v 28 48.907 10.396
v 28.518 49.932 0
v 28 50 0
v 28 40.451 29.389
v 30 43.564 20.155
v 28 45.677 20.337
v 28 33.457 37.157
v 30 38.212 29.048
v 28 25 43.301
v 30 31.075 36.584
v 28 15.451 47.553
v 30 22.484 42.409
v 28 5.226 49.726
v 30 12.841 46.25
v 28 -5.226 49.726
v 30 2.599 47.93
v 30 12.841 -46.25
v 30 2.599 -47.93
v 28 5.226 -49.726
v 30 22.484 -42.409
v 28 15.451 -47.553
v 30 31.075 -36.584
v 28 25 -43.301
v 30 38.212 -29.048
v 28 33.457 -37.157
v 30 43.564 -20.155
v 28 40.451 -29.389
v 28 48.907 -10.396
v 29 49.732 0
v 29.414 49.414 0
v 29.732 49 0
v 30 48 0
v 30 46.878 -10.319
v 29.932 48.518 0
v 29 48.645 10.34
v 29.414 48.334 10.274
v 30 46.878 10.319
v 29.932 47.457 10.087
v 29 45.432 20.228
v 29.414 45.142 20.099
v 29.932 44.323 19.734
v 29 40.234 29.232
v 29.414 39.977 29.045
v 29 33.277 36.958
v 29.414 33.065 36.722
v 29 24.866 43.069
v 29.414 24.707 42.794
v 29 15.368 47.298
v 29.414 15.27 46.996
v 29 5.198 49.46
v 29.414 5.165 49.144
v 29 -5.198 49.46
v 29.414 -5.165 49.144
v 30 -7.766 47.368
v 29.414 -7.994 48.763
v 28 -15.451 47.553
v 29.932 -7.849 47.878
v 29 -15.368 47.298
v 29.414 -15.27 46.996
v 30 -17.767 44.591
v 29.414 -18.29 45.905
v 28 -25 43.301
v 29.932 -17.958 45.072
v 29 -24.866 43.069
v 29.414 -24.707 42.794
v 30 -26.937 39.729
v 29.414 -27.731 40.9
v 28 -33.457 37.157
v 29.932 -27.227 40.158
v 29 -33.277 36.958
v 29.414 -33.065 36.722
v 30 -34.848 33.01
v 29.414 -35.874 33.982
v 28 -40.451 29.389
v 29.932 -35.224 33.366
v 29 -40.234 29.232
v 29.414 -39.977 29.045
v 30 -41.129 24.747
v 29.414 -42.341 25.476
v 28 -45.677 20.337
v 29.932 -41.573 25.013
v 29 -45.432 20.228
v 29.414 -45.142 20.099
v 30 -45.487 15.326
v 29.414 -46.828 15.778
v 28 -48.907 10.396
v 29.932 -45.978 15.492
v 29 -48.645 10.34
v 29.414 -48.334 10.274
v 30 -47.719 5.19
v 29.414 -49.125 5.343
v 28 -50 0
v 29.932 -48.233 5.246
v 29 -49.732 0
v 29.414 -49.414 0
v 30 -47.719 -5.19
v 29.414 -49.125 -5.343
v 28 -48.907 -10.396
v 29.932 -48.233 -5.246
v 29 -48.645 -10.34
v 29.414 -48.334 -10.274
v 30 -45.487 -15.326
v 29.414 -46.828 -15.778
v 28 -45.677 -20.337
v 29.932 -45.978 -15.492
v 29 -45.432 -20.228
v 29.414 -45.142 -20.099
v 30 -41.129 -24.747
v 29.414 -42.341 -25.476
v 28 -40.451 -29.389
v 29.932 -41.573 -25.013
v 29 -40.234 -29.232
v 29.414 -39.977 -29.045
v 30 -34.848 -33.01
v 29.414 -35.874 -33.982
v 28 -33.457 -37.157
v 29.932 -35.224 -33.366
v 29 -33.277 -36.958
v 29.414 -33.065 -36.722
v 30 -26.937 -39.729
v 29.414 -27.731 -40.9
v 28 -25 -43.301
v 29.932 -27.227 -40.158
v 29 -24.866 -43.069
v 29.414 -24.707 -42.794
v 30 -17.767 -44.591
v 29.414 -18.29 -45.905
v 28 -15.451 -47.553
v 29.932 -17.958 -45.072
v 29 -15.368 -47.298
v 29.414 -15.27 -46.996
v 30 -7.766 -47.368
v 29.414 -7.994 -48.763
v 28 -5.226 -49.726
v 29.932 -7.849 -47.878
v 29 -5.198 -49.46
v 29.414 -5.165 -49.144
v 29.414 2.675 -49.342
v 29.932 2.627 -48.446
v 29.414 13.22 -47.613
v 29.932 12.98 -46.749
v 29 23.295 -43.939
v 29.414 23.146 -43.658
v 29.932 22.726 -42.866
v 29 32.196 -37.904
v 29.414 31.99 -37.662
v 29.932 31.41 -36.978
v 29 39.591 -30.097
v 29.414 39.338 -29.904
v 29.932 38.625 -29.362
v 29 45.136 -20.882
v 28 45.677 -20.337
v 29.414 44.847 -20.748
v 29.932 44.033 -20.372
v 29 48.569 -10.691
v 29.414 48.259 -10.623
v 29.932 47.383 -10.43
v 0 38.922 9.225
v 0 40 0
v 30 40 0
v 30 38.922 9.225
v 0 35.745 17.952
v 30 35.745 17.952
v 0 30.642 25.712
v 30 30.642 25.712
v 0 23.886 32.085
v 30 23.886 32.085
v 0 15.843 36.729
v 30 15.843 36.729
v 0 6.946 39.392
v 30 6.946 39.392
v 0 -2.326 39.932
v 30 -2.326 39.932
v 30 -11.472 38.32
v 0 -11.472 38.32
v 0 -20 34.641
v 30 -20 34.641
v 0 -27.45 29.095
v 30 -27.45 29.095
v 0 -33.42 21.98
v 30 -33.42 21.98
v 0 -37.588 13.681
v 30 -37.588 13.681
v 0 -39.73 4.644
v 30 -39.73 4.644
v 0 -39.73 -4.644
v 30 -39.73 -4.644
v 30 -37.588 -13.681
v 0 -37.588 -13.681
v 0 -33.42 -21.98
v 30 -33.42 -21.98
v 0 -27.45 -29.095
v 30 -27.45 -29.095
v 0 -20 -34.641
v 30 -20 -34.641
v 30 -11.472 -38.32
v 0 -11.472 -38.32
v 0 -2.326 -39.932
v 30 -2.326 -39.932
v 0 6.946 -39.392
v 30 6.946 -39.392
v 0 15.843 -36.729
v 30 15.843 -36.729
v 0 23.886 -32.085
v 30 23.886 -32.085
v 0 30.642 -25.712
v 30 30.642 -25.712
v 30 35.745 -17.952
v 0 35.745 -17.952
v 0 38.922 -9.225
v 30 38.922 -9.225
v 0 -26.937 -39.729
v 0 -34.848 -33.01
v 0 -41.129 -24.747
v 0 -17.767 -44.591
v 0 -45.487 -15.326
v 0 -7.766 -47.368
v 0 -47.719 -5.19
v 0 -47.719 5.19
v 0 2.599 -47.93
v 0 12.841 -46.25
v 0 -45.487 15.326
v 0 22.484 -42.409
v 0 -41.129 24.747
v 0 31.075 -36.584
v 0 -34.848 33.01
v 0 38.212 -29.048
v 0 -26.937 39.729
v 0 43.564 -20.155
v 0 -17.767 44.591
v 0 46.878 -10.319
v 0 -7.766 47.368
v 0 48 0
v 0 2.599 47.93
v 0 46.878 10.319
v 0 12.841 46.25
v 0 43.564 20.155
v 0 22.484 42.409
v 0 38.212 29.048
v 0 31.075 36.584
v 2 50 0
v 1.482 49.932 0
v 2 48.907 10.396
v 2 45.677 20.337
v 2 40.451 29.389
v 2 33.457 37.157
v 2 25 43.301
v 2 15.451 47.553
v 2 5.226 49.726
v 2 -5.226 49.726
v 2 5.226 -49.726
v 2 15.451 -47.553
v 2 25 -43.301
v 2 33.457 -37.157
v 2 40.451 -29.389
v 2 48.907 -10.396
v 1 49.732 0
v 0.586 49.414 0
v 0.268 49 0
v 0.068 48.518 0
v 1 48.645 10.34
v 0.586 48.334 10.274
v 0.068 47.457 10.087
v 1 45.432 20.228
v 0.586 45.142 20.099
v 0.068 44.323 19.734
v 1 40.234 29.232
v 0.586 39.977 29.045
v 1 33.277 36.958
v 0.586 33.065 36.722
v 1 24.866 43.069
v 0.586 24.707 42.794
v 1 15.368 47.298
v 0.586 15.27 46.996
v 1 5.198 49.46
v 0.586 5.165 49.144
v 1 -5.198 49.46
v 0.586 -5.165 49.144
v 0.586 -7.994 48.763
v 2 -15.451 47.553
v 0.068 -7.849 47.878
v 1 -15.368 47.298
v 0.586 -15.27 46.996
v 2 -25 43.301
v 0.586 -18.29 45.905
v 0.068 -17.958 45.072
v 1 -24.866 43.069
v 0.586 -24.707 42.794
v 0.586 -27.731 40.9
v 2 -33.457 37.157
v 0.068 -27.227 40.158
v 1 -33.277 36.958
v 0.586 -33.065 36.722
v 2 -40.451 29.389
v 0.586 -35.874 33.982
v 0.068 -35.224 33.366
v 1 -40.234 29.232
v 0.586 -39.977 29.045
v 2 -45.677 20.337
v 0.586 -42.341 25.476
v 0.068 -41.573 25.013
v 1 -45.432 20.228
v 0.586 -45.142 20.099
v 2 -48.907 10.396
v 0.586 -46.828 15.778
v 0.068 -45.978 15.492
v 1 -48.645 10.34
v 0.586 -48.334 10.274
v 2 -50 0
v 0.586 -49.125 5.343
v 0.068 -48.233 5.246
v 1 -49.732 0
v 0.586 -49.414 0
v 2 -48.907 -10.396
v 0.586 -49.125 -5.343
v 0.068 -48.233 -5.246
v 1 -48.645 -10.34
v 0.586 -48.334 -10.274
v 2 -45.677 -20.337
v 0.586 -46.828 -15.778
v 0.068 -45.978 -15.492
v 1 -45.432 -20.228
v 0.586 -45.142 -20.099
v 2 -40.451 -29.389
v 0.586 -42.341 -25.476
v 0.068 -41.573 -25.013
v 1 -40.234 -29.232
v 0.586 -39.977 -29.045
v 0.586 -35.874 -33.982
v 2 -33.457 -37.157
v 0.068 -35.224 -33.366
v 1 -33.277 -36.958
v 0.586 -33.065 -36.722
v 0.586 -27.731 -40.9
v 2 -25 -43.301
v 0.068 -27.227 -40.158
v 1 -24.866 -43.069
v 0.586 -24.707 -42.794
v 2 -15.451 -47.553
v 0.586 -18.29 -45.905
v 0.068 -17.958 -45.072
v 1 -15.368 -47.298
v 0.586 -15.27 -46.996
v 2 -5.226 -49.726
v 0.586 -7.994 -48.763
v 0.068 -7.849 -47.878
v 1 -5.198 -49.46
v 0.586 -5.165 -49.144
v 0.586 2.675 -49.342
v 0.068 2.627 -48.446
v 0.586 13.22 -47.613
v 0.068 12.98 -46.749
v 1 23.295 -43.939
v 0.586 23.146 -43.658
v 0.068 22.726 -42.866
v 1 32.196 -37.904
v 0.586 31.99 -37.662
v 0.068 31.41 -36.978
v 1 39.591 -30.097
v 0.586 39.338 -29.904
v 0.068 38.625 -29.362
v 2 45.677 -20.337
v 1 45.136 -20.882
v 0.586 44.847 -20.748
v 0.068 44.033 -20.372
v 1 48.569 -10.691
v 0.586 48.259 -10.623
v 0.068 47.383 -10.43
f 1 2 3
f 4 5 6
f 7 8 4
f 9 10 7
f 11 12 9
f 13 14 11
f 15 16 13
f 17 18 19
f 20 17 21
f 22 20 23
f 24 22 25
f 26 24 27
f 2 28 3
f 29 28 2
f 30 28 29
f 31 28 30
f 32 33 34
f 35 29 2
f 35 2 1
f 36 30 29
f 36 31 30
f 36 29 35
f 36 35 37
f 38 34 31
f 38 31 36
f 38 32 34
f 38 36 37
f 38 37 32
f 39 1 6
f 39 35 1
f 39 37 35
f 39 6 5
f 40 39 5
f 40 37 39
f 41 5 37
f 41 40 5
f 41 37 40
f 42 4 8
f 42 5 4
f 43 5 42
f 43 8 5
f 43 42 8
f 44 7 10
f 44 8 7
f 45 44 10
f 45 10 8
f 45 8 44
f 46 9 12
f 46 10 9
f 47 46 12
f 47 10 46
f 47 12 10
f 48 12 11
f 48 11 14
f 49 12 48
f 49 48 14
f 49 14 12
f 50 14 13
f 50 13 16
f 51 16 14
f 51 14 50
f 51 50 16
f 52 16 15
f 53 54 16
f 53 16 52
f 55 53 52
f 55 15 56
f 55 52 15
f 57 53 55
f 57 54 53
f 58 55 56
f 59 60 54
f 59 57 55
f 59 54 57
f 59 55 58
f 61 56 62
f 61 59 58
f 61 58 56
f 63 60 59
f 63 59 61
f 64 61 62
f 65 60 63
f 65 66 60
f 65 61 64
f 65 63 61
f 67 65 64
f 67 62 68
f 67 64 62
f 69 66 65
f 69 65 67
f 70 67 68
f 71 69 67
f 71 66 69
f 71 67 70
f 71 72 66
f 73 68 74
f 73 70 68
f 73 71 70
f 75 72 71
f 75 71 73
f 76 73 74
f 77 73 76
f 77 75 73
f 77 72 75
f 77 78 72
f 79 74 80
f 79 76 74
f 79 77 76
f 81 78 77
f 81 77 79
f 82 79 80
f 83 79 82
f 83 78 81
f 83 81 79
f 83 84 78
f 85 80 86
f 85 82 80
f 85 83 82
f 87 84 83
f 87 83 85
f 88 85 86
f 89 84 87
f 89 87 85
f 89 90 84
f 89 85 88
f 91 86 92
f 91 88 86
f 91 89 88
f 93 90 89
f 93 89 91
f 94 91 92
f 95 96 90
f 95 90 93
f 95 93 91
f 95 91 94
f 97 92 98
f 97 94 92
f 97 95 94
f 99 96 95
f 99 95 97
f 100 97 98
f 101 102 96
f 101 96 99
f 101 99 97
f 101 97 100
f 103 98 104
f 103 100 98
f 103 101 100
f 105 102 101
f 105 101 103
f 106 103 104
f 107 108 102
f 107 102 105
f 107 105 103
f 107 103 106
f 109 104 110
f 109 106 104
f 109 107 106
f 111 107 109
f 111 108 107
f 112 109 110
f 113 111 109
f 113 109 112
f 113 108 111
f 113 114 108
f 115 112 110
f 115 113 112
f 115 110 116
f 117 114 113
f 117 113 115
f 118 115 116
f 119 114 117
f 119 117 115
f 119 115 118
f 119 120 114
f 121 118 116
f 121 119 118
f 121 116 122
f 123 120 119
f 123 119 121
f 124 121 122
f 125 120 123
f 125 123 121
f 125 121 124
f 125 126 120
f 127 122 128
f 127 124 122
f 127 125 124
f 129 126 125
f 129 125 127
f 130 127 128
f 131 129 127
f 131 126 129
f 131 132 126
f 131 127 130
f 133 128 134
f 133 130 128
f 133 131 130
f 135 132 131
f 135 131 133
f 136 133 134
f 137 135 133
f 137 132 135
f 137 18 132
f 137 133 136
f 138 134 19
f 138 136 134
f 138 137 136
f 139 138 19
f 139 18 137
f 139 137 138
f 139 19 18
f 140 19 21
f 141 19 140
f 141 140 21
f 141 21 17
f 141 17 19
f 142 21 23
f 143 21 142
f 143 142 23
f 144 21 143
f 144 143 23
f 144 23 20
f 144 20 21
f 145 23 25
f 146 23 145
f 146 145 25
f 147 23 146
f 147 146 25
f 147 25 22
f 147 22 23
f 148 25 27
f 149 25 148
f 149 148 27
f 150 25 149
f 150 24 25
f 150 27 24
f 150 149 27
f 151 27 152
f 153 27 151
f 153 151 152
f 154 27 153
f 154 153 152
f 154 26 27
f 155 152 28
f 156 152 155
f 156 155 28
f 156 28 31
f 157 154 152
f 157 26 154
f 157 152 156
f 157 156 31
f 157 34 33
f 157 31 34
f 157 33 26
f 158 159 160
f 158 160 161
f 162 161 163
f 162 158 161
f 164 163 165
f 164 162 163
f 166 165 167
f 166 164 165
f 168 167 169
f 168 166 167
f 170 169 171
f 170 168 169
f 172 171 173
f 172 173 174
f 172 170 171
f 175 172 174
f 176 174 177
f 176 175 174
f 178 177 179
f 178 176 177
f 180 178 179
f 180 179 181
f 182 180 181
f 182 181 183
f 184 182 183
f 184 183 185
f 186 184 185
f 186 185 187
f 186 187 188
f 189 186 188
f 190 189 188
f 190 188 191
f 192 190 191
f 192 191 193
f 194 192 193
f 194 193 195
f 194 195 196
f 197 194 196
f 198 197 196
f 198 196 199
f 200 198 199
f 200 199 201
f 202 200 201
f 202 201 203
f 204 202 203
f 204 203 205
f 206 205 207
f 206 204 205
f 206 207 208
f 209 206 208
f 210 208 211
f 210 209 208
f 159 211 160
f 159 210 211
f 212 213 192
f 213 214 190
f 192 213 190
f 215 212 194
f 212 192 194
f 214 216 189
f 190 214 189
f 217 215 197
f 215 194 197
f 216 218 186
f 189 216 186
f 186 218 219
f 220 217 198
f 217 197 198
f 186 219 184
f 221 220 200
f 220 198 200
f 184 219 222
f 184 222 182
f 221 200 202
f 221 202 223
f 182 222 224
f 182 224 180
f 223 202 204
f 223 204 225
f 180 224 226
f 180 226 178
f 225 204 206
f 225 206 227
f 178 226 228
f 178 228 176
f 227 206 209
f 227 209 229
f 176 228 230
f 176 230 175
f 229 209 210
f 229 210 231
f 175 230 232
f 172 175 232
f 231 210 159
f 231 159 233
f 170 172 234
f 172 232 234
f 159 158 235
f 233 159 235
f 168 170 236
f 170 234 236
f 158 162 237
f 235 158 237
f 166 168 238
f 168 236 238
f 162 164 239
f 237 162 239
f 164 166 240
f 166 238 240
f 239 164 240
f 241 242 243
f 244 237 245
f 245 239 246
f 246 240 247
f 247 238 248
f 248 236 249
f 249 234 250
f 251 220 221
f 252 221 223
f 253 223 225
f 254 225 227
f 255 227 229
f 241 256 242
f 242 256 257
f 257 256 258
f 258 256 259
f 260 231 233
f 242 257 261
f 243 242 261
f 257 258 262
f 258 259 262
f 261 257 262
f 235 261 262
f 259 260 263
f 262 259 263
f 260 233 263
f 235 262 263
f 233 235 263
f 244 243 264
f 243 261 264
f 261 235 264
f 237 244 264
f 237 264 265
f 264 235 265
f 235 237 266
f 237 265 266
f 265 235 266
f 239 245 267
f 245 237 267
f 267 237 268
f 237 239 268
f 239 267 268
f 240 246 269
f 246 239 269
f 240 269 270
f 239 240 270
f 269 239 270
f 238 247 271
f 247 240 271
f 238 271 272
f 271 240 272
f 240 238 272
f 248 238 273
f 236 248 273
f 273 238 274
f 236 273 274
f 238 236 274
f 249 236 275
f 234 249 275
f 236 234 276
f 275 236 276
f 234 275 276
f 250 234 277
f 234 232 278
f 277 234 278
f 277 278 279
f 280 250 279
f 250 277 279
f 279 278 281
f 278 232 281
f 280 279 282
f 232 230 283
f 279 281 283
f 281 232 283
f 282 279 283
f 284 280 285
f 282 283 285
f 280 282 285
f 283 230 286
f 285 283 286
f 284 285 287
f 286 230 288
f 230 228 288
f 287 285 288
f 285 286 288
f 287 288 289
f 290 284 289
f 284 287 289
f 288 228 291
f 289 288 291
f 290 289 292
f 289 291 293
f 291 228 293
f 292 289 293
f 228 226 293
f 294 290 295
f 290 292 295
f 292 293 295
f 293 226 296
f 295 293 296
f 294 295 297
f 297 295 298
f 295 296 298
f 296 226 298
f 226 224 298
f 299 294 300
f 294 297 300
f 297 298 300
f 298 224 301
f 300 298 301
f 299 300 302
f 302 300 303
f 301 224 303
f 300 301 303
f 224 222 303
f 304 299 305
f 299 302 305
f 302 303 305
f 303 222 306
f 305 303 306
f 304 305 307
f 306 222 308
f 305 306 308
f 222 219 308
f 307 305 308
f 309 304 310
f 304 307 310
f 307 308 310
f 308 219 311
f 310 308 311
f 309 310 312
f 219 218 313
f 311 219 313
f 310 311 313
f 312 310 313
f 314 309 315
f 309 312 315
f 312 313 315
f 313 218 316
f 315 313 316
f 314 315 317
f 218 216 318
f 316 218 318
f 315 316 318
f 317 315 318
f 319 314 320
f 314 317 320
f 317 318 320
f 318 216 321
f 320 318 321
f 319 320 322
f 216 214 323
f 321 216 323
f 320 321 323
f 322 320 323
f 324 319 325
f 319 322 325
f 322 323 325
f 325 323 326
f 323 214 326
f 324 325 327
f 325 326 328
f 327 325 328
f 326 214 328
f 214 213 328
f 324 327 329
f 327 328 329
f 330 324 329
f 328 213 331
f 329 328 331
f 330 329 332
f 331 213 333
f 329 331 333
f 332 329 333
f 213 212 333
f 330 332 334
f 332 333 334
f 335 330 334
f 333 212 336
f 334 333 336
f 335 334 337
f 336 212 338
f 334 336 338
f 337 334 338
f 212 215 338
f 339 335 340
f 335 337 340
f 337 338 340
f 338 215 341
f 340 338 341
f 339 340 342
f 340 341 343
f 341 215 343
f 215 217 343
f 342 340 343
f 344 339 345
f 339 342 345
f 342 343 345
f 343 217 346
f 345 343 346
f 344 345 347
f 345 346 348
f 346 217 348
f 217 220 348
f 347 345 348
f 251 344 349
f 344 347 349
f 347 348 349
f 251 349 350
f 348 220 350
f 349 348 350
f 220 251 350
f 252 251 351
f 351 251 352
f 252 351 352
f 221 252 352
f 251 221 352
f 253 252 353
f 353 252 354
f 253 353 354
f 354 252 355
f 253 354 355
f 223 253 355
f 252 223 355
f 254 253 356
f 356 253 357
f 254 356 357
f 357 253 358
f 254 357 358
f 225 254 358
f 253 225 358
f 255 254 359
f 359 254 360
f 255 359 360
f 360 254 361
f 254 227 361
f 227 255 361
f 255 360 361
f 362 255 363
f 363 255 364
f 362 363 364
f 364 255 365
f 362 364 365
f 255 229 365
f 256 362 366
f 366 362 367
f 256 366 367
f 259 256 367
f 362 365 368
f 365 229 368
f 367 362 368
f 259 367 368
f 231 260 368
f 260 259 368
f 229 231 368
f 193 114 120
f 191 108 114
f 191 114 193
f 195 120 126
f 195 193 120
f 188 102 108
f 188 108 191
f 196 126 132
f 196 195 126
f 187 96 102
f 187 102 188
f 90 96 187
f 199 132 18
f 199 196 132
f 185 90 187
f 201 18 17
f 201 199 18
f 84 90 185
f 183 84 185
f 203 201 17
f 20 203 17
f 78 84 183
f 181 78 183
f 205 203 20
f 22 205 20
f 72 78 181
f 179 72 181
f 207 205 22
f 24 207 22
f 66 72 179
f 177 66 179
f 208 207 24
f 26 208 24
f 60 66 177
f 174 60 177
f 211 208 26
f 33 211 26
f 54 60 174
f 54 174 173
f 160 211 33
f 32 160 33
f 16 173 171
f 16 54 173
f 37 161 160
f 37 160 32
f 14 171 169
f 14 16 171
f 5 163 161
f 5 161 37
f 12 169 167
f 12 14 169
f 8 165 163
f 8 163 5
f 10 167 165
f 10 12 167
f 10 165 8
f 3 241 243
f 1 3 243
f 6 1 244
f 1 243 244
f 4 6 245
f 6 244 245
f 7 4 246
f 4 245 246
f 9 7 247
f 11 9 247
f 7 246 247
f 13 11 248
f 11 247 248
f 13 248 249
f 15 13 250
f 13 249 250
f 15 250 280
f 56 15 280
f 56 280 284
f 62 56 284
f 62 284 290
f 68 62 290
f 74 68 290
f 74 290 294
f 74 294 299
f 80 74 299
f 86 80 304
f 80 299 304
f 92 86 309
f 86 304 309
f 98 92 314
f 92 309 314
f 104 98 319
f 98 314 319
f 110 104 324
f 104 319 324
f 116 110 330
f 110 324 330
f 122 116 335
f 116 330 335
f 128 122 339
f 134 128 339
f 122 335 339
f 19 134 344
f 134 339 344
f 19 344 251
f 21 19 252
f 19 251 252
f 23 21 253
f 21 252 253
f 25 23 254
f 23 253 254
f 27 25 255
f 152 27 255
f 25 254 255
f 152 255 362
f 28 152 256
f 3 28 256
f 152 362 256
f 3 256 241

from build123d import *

# Parameters (mm, degrees)
F0_R     = 50
F0_R_2   = 40
F1_DEPTH = 28
F2_DEPTH = 30
F3_R     = 2
F4_R     = 2


with BuildPart() as f1:
    # F0 (on Right) → F1 (new body)
    with BuildSketch(Plane.YZ):
        Circle(F0_R)
        Circle(F0_R_2, mode=Mode.SUBTRACT)
    extrude(amount=F1_DEPTH)

    # F0 (on Right) → F2 (join)
    with BuildSketch(Plane.YZ):
        Circle(F0_R)
        Circle(F0_R_2, mode=Mode.SUBTRACT)
    extrude(amount=F2_DEPTH)

    # F3
    f3_edges = [f1.edges().sort_by_distance(p)[0] for p in [
        (30, -50, 0),
    ]]
    fillet(f3_edges, radius=F3_R)

    # F4
    f4_edges = [f1.edges().sort_by_distance(p)[0] for p in [
        (0, -50, 0),
    ]]
    fillet(f4_edges, radius=F4_R)


solid = f1.part
